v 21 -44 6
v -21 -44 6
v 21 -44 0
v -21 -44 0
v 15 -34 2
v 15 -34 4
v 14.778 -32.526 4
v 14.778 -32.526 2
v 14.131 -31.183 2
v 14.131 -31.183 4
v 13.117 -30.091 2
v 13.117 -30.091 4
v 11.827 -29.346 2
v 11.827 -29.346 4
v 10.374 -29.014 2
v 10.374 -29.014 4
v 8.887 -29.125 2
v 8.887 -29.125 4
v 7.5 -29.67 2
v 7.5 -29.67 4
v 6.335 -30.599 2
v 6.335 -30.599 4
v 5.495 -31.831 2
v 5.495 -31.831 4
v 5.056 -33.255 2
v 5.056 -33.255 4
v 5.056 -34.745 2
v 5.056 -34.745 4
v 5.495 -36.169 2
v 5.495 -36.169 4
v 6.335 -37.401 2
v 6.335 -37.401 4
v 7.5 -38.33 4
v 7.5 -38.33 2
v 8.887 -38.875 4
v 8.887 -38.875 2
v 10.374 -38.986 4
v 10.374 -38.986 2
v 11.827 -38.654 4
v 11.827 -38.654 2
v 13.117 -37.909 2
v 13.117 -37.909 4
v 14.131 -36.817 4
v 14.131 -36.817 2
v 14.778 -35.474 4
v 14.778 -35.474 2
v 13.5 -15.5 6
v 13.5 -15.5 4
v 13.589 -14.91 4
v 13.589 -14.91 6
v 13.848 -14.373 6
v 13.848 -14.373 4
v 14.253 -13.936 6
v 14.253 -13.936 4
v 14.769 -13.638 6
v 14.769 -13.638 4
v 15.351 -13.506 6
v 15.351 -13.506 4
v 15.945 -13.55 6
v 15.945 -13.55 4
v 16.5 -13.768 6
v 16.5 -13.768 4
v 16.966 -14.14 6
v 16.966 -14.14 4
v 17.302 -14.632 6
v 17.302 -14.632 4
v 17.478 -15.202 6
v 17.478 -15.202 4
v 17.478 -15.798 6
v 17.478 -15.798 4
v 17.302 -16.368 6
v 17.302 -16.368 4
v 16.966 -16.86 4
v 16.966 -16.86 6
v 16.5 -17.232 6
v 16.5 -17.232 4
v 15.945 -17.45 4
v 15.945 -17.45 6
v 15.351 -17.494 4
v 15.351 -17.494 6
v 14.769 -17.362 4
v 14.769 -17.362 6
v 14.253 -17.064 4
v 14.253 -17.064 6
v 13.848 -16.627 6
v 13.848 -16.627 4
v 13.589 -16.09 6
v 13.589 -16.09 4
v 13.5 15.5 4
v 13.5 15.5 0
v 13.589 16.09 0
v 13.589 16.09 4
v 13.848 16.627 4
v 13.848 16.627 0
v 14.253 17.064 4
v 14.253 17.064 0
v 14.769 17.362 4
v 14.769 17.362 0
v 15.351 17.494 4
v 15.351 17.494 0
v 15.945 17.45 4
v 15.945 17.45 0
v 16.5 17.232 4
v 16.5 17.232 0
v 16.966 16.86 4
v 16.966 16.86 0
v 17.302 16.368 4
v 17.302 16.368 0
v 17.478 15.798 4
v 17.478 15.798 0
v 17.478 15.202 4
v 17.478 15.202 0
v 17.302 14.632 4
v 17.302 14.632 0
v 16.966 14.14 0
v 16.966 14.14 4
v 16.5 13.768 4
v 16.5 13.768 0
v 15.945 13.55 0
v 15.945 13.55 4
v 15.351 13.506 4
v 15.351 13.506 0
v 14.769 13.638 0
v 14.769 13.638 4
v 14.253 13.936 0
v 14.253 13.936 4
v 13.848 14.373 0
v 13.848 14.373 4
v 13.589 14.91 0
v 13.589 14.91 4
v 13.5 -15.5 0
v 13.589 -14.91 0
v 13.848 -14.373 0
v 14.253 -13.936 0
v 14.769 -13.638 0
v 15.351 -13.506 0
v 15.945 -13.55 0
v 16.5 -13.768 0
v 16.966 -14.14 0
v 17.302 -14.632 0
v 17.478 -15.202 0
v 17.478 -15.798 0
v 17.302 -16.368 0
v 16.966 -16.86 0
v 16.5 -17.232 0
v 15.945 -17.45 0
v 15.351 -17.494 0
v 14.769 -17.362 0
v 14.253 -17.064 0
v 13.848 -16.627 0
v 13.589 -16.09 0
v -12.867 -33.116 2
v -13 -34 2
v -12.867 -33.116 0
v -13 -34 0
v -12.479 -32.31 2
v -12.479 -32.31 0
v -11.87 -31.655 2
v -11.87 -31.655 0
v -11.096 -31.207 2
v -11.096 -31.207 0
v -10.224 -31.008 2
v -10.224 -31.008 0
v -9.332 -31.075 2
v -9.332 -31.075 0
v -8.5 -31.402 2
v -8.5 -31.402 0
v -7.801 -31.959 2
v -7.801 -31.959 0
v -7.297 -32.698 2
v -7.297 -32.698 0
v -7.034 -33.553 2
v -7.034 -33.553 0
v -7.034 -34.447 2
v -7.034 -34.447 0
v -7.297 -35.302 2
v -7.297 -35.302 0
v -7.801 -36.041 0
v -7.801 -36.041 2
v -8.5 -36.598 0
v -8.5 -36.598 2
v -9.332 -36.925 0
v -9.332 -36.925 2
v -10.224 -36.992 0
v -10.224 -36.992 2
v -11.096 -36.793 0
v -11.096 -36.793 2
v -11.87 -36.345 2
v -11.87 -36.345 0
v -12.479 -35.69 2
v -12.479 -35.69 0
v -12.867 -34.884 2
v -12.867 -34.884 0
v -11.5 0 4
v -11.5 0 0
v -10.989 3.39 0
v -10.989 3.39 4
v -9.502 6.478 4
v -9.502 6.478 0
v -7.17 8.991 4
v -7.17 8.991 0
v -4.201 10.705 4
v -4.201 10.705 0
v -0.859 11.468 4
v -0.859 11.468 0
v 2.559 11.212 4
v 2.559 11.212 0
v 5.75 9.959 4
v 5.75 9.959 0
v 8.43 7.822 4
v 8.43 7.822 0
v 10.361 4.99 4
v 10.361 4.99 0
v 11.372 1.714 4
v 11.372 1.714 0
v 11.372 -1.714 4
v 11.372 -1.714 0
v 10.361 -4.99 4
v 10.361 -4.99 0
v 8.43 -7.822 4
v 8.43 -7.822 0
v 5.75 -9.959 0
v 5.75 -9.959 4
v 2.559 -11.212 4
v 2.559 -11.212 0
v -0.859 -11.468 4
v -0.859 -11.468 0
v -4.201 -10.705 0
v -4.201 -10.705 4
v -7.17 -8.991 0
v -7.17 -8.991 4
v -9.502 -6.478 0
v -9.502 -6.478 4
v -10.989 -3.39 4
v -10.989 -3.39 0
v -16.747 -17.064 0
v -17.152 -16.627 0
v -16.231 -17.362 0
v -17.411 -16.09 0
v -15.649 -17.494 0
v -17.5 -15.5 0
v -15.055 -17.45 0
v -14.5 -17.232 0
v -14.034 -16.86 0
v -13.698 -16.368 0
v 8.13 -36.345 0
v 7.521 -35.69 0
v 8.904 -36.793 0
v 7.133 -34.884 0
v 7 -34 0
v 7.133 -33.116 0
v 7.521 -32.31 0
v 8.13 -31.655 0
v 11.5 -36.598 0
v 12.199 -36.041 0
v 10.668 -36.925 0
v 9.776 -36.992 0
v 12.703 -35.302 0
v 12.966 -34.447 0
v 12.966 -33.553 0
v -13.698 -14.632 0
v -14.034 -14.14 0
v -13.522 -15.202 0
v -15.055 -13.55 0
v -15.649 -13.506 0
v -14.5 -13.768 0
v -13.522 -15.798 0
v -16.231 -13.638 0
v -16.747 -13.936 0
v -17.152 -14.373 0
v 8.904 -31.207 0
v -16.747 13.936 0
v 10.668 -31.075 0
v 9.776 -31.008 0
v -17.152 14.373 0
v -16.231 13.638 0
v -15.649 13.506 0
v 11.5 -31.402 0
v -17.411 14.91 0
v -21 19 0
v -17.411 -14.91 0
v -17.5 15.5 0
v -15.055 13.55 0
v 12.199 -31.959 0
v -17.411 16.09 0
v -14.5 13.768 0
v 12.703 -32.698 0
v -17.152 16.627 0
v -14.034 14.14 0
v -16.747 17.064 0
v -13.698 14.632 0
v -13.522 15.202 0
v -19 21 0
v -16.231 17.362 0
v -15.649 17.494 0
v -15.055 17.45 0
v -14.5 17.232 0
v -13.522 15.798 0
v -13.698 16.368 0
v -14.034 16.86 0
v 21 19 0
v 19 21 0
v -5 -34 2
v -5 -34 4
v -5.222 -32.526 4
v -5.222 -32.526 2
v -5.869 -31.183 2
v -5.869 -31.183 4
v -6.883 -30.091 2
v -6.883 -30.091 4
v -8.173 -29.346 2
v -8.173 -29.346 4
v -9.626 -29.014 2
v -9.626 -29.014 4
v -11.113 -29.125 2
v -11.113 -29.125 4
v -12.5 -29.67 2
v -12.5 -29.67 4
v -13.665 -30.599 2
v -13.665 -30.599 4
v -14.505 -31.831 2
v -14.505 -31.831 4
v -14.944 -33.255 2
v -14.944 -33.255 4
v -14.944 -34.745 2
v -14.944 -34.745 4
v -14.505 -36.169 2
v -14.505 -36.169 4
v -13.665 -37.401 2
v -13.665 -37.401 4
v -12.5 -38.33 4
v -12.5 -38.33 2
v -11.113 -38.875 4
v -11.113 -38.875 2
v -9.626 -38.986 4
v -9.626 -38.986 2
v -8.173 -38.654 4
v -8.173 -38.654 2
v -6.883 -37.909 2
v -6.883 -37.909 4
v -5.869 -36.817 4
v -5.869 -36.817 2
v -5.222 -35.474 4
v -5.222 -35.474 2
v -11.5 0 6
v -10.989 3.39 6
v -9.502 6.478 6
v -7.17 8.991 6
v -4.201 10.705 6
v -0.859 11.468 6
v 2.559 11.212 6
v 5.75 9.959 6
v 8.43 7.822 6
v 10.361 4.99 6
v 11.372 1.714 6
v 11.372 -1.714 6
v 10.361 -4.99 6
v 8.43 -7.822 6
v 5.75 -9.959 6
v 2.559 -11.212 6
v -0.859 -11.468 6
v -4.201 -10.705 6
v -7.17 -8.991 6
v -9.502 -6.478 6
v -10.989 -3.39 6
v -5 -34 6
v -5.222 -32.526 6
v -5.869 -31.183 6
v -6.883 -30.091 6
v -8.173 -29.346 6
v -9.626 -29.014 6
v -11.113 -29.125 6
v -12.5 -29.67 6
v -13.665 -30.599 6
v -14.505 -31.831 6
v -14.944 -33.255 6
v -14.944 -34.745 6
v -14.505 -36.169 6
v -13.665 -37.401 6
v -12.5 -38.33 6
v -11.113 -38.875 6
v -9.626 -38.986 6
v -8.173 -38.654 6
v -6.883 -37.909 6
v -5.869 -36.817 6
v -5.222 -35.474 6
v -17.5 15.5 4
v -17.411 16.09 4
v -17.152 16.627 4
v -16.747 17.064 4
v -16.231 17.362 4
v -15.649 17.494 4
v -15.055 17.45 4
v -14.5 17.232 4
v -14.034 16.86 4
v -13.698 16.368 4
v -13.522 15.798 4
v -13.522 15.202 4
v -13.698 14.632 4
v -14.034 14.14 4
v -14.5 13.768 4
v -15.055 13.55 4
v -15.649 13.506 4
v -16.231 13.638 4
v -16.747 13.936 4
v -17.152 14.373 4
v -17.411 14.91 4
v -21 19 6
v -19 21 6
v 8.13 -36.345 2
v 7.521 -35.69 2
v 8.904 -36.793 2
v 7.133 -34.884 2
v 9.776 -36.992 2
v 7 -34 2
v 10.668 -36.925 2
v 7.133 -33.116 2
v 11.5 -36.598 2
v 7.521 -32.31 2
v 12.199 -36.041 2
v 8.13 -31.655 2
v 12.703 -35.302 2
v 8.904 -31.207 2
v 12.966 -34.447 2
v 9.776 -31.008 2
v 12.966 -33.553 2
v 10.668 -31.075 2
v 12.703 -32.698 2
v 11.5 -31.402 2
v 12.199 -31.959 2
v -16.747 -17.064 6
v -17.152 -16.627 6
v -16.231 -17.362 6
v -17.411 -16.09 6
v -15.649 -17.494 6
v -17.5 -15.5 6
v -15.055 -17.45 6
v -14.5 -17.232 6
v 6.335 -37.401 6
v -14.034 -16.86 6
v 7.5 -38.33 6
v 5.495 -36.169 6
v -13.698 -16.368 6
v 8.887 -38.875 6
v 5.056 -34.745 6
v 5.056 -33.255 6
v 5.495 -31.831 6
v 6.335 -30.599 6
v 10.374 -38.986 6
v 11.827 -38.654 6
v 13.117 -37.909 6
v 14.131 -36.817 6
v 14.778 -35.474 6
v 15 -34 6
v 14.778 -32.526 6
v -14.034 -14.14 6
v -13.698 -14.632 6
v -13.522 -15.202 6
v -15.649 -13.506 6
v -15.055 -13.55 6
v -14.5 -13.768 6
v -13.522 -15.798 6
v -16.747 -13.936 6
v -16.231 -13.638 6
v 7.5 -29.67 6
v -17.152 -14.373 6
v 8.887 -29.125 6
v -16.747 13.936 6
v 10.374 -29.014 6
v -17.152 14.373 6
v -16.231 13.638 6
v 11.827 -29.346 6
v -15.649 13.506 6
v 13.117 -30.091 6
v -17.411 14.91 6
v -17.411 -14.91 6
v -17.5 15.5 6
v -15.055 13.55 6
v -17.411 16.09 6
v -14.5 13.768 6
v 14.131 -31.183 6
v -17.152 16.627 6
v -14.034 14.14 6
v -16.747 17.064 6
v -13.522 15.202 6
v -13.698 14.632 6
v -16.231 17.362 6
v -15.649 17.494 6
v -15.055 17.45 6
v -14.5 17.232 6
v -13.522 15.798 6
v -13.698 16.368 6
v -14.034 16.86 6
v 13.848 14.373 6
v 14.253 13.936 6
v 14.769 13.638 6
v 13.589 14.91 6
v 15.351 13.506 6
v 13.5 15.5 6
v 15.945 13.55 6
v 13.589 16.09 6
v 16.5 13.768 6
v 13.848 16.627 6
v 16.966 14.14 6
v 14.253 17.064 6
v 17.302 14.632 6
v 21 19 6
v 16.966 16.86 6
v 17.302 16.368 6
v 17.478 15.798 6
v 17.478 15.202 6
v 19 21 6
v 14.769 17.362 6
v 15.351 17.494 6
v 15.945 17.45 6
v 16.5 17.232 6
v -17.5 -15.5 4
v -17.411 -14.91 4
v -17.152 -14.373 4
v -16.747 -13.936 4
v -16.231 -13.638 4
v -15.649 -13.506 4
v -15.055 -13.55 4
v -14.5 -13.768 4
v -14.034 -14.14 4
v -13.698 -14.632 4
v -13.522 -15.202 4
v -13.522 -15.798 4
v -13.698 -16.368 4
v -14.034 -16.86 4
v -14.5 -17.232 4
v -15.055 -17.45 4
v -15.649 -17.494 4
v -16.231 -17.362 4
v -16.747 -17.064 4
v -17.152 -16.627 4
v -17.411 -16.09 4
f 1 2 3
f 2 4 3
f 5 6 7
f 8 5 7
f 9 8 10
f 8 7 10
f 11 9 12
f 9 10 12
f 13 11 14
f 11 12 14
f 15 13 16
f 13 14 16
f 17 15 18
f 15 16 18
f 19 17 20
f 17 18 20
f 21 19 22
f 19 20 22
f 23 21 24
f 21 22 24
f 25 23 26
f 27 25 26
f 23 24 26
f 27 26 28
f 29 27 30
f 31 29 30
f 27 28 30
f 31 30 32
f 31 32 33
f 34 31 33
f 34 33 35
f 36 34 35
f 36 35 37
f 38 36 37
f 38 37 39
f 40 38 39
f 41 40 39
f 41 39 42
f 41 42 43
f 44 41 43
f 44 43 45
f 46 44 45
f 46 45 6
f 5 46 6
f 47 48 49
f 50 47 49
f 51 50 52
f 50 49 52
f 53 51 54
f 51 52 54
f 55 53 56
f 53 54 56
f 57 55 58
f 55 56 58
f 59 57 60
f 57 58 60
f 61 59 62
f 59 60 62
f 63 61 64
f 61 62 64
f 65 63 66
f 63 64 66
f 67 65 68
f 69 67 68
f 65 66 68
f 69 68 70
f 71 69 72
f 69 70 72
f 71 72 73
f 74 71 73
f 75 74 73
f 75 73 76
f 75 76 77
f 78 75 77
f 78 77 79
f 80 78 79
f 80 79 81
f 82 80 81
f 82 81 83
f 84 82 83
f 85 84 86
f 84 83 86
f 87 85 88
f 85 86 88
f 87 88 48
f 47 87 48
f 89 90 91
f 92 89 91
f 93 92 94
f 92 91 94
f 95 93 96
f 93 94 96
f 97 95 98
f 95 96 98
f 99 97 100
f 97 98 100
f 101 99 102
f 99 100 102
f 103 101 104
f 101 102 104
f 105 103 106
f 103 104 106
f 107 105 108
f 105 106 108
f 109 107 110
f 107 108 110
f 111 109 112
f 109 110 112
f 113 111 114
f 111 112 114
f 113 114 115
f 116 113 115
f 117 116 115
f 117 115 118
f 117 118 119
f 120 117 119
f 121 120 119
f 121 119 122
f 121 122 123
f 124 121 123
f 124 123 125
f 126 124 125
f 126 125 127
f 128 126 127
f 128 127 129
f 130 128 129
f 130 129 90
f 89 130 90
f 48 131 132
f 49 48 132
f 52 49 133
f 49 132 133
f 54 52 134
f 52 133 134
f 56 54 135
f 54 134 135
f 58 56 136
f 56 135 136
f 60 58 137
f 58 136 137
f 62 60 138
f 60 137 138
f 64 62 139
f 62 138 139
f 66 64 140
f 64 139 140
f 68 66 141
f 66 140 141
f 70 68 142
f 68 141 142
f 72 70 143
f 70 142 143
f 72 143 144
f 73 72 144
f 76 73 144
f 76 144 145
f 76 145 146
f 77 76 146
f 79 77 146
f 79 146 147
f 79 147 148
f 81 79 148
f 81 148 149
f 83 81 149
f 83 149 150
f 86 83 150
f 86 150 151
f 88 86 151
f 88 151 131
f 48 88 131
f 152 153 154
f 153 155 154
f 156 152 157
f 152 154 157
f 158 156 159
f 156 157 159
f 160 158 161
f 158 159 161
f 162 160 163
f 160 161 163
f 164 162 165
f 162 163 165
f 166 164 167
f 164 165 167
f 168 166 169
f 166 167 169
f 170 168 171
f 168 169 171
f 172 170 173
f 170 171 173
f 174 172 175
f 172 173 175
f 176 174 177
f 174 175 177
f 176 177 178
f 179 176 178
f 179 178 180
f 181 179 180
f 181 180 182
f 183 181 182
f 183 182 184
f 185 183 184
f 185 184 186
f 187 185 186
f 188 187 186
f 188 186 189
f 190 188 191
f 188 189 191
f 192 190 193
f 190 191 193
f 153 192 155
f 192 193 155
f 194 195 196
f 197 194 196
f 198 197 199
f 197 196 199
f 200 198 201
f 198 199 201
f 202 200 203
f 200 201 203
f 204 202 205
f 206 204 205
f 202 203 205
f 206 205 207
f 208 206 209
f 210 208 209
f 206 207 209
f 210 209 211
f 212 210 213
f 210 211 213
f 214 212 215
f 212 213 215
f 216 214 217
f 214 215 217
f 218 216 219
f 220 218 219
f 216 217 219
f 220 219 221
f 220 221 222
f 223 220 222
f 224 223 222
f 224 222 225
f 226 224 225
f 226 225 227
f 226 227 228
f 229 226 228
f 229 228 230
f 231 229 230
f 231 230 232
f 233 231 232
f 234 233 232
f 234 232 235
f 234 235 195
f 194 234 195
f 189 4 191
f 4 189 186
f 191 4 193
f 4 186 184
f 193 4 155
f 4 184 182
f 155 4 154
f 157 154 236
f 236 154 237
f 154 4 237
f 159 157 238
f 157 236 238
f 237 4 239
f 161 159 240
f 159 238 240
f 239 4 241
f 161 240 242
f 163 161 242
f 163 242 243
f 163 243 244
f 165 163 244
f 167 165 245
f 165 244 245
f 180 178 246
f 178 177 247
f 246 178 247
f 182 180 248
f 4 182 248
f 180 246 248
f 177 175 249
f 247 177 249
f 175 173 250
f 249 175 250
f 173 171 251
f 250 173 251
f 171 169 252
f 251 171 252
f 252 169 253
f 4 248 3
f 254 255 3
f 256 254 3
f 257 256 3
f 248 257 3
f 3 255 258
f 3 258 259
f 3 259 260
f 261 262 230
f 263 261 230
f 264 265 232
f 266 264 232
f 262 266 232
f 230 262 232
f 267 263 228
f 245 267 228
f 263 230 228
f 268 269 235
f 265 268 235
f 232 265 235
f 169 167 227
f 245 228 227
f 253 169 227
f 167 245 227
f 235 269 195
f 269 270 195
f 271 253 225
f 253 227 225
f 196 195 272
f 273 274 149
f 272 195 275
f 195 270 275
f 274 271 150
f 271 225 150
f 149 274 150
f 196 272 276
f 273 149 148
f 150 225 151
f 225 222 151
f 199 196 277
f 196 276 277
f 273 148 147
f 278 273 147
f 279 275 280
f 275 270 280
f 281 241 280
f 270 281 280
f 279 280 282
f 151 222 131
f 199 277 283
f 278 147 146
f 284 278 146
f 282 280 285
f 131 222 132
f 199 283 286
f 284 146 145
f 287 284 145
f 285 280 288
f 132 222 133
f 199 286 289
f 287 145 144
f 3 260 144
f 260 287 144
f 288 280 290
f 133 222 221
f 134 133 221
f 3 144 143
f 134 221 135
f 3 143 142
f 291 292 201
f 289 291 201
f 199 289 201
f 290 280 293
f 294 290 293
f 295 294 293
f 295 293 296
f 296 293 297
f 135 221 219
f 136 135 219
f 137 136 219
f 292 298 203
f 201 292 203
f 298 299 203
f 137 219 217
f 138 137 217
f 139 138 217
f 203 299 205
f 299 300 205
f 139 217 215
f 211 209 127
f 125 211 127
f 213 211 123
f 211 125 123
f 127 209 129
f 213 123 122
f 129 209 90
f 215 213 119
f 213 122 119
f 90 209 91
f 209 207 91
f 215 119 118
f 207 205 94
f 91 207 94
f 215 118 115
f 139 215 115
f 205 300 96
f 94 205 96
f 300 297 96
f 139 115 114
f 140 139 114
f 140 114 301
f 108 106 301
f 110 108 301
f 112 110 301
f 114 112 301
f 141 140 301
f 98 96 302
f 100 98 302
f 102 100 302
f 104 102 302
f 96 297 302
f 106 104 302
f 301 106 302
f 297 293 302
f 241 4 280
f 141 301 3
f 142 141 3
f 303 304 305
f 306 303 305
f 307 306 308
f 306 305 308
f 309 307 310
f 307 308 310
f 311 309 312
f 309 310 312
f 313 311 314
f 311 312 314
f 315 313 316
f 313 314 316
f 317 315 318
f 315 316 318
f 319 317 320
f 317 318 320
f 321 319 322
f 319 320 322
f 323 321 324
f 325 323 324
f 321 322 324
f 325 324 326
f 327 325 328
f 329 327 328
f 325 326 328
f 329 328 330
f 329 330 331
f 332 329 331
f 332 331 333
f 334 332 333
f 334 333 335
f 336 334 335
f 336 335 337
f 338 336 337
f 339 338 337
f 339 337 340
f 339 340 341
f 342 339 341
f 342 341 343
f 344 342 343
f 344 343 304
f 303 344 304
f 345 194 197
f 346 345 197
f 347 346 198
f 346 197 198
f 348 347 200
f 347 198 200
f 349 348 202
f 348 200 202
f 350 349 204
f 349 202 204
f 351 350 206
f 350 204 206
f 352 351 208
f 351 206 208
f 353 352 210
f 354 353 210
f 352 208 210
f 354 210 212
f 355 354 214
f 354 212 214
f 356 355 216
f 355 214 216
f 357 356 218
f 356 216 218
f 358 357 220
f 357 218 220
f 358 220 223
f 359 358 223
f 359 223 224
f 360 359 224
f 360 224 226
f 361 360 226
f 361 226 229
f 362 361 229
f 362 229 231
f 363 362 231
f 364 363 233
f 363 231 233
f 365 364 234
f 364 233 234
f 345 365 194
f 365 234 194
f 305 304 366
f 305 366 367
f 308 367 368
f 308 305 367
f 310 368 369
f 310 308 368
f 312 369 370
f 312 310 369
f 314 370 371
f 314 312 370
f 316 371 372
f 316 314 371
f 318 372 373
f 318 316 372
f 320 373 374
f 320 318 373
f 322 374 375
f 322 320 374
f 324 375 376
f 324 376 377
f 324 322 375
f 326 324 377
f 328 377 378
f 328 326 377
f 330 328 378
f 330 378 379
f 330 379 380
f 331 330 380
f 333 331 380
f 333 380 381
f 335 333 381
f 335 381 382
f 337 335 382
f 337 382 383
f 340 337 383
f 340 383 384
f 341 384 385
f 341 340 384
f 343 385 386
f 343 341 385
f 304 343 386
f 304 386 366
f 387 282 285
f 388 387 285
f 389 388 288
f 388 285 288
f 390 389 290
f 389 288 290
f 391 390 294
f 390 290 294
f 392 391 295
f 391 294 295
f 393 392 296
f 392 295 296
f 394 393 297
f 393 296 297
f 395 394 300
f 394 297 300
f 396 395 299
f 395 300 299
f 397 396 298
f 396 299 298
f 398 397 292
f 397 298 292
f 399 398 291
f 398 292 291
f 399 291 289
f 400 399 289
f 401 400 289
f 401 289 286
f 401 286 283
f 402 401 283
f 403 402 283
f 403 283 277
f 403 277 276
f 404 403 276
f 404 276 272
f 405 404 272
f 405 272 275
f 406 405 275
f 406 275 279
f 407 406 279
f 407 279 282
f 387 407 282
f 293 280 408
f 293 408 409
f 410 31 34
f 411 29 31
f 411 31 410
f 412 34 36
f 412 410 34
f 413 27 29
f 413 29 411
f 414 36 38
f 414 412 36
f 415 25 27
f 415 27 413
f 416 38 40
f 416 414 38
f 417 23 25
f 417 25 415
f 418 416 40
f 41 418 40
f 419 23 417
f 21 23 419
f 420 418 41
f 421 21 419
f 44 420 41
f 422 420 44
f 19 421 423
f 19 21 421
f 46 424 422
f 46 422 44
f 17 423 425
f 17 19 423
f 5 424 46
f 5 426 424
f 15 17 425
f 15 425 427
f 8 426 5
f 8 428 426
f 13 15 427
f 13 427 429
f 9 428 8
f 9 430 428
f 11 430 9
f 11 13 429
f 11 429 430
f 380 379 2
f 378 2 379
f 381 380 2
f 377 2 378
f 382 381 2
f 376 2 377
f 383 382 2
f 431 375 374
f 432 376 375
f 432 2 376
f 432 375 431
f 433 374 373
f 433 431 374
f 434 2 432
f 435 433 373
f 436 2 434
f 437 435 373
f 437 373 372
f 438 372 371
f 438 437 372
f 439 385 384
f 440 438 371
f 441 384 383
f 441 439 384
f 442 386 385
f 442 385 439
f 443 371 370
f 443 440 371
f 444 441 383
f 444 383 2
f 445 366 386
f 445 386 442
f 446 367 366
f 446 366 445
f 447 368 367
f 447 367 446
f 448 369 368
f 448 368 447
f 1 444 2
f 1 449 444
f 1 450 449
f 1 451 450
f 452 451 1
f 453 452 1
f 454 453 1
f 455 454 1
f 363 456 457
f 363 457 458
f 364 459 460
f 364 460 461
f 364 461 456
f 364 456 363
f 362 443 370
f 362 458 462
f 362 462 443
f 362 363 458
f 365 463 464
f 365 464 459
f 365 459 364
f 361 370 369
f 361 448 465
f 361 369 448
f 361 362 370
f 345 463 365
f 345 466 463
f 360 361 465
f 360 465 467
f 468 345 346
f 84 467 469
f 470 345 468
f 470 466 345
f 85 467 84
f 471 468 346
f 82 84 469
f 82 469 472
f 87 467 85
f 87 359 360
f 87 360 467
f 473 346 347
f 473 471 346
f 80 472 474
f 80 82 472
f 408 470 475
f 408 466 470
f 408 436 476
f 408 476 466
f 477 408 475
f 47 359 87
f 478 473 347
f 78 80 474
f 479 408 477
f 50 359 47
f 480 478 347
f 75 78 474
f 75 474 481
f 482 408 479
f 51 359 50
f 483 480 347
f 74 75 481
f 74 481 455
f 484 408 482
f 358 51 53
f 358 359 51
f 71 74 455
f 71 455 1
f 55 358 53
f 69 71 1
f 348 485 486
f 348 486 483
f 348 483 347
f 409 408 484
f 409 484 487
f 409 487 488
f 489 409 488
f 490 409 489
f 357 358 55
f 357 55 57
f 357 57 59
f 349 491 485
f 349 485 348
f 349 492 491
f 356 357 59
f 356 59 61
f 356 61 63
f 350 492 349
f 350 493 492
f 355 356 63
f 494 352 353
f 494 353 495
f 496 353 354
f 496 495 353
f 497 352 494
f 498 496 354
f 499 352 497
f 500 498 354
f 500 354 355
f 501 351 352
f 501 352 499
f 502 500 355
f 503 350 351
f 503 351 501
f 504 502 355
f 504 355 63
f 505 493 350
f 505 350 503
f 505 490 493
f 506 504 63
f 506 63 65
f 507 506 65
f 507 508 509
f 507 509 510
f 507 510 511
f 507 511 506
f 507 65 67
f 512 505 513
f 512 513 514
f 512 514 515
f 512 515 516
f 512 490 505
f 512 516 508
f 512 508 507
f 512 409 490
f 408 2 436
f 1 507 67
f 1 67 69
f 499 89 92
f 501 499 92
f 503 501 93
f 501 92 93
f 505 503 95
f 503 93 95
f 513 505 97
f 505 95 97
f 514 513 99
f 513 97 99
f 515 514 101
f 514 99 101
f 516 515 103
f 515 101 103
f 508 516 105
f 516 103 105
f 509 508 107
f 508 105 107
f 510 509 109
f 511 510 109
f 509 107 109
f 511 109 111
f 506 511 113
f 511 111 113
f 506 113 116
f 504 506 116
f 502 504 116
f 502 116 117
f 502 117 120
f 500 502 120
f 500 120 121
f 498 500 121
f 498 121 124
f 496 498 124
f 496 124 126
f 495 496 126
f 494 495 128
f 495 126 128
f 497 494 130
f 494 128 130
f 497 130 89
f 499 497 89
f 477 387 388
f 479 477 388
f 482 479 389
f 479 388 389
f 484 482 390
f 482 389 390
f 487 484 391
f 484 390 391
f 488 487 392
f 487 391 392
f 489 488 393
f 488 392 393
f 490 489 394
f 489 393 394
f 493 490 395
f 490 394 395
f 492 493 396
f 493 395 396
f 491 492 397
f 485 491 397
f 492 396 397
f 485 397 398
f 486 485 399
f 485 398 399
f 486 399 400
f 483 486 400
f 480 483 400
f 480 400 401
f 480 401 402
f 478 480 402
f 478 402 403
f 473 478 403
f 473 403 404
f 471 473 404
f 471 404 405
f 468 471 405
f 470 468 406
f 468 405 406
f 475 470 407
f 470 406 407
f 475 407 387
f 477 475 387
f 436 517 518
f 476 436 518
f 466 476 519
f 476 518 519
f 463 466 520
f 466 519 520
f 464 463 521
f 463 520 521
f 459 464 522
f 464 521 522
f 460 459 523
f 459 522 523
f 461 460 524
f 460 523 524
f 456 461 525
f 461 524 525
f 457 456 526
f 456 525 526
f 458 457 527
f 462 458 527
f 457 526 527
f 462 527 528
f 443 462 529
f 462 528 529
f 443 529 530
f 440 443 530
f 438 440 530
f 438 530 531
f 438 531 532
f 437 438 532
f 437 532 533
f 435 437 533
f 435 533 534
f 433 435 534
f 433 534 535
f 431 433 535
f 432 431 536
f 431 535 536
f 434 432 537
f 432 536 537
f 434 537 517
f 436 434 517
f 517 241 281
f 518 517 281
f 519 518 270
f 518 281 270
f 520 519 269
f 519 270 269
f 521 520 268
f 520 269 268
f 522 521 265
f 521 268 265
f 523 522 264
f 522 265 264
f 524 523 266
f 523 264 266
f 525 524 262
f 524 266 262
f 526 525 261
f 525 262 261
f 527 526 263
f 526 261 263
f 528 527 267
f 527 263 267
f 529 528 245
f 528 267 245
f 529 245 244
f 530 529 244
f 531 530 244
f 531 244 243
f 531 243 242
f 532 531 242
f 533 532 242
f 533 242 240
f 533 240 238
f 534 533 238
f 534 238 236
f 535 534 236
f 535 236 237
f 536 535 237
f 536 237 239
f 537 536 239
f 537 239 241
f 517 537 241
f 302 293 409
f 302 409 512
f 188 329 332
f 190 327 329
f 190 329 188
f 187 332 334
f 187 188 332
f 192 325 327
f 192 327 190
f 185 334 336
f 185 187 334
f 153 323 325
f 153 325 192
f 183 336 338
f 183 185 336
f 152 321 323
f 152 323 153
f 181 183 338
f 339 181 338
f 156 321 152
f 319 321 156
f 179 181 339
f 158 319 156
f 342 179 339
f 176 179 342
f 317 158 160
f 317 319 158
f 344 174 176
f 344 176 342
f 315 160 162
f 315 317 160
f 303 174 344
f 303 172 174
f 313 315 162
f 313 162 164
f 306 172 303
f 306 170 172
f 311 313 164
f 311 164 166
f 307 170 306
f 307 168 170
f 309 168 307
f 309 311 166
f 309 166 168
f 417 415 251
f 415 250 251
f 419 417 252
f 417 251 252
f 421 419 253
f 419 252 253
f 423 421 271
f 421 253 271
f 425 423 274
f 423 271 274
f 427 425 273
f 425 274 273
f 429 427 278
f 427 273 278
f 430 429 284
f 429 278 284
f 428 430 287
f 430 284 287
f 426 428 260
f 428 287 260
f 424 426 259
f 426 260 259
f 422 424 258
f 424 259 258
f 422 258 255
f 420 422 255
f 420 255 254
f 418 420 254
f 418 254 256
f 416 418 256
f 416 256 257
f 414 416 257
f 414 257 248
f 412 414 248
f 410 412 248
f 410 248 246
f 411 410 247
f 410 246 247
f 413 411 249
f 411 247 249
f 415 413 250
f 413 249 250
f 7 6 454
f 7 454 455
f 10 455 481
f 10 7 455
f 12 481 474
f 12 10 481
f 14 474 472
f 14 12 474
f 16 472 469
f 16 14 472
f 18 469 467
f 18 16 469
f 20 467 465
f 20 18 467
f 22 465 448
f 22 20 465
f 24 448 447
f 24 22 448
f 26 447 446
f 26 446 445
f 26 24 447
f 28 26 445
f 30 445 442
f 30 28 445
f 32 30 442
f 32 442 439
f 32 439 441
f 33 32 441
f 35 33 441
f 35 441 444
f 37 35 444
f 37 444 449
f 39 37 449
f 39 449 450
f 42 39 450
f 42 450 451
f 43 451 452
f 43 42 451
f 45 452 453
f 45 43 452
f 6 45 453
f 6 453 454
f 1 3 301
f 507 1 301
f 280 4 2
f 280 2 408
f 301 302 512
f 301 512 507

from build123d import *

# Parameters (mm, degrees)
F0_W           = 42
F0_H           = 42
F1_DEPTH       = 4
F3_D           = 4
F3_DEPTH       = 55
F3_TIP         = 1.2017212381
F4_D           = 23
F4_DEPTH       = 55
F4_TIP         = 6.9098971188
F5_DEPTH       = 23
F7_D           = 6
F7_DEPTH       = 55
F7_CBORE_D     = 10
F7_CBORE_DEPTH = 2
F7_TIP         = 1.8025818571
F8_SIZE        = 2
F9_DEPTH       = 2


with BuildPart() as f1:
    # F0 (on Top) → F1 (new body)
    with BuildSketch(Plane.XY):
        Rectangle(F0_W, F0_H)
    extrude(amount=F1_DEPTH)

    # F3
    with Locations(Plane.XY.offset(4)):
        with Locations((-15.5, 15.5), (-15.5, -15.5), (15.5, 15.5), (15.5, -15.5)):
            Hole(F3_D / 2, depth=F3_DEPTH)
            with Locations((0, 0, -(F3_DEPTH + F3_TIP / 2))):  # 118° drill point
                Cone(0, F3_D / 2, F3_TIP, mode=Mode.SUBTRACT)

    # F4
    with Locations(Plane.XY.offset(4)):
        with Locations((0, 0)):
            Hole(F4_D / 2, depth=F4_DEPTH)
            with Locations((0, 0, -(F4_DEPTH + F4_TIP / 2))):  # 118° drill point
                Cone(0, F4_D / 2, F4_TIP, mode=Mode.SUBTRACT)

    # F5 (add): a face of the model
    f5_faces = [f1.faces().sort_by_distance(p)[0] for p in [
        (0, -21, 2),
    ]]
    extrude(f5_faces, amount=F5_DEPTH)

    # F7
    with Locations(Plane.XY.offset(4)):
        with Locations((-10, -34), (10, -34)):
            CounterBoreHole(F7_D / 2, F7_CBORE_D / 2, F7_CBORE_DEPTH, depth=F7_DEPTH)
            with Locations((0, 0, -(F7_DEPTH + F7_TIP / 2))):  # 118° drill point
                Cone(0, F7_D / 2, F7_TIP, mode=Mode.SUBTRACT)

    # F8
    f8_edges = [f1.edges().sort_by_distance(p)[0] for p in [
        (21, 21, 2),
        (-21, 21, 2),
    ]]
    chamfer(f8_edges, length=F8_SIZE)

    # F9 (add): a face of the model
    f9_faces = [f1.faces().sort_by_distance(p)[0] for p in [
        (0, -12.426722897, 4),
    ]]
    extrude(f9_faces, amount=F9_DEPTH)


solid = f1.part
